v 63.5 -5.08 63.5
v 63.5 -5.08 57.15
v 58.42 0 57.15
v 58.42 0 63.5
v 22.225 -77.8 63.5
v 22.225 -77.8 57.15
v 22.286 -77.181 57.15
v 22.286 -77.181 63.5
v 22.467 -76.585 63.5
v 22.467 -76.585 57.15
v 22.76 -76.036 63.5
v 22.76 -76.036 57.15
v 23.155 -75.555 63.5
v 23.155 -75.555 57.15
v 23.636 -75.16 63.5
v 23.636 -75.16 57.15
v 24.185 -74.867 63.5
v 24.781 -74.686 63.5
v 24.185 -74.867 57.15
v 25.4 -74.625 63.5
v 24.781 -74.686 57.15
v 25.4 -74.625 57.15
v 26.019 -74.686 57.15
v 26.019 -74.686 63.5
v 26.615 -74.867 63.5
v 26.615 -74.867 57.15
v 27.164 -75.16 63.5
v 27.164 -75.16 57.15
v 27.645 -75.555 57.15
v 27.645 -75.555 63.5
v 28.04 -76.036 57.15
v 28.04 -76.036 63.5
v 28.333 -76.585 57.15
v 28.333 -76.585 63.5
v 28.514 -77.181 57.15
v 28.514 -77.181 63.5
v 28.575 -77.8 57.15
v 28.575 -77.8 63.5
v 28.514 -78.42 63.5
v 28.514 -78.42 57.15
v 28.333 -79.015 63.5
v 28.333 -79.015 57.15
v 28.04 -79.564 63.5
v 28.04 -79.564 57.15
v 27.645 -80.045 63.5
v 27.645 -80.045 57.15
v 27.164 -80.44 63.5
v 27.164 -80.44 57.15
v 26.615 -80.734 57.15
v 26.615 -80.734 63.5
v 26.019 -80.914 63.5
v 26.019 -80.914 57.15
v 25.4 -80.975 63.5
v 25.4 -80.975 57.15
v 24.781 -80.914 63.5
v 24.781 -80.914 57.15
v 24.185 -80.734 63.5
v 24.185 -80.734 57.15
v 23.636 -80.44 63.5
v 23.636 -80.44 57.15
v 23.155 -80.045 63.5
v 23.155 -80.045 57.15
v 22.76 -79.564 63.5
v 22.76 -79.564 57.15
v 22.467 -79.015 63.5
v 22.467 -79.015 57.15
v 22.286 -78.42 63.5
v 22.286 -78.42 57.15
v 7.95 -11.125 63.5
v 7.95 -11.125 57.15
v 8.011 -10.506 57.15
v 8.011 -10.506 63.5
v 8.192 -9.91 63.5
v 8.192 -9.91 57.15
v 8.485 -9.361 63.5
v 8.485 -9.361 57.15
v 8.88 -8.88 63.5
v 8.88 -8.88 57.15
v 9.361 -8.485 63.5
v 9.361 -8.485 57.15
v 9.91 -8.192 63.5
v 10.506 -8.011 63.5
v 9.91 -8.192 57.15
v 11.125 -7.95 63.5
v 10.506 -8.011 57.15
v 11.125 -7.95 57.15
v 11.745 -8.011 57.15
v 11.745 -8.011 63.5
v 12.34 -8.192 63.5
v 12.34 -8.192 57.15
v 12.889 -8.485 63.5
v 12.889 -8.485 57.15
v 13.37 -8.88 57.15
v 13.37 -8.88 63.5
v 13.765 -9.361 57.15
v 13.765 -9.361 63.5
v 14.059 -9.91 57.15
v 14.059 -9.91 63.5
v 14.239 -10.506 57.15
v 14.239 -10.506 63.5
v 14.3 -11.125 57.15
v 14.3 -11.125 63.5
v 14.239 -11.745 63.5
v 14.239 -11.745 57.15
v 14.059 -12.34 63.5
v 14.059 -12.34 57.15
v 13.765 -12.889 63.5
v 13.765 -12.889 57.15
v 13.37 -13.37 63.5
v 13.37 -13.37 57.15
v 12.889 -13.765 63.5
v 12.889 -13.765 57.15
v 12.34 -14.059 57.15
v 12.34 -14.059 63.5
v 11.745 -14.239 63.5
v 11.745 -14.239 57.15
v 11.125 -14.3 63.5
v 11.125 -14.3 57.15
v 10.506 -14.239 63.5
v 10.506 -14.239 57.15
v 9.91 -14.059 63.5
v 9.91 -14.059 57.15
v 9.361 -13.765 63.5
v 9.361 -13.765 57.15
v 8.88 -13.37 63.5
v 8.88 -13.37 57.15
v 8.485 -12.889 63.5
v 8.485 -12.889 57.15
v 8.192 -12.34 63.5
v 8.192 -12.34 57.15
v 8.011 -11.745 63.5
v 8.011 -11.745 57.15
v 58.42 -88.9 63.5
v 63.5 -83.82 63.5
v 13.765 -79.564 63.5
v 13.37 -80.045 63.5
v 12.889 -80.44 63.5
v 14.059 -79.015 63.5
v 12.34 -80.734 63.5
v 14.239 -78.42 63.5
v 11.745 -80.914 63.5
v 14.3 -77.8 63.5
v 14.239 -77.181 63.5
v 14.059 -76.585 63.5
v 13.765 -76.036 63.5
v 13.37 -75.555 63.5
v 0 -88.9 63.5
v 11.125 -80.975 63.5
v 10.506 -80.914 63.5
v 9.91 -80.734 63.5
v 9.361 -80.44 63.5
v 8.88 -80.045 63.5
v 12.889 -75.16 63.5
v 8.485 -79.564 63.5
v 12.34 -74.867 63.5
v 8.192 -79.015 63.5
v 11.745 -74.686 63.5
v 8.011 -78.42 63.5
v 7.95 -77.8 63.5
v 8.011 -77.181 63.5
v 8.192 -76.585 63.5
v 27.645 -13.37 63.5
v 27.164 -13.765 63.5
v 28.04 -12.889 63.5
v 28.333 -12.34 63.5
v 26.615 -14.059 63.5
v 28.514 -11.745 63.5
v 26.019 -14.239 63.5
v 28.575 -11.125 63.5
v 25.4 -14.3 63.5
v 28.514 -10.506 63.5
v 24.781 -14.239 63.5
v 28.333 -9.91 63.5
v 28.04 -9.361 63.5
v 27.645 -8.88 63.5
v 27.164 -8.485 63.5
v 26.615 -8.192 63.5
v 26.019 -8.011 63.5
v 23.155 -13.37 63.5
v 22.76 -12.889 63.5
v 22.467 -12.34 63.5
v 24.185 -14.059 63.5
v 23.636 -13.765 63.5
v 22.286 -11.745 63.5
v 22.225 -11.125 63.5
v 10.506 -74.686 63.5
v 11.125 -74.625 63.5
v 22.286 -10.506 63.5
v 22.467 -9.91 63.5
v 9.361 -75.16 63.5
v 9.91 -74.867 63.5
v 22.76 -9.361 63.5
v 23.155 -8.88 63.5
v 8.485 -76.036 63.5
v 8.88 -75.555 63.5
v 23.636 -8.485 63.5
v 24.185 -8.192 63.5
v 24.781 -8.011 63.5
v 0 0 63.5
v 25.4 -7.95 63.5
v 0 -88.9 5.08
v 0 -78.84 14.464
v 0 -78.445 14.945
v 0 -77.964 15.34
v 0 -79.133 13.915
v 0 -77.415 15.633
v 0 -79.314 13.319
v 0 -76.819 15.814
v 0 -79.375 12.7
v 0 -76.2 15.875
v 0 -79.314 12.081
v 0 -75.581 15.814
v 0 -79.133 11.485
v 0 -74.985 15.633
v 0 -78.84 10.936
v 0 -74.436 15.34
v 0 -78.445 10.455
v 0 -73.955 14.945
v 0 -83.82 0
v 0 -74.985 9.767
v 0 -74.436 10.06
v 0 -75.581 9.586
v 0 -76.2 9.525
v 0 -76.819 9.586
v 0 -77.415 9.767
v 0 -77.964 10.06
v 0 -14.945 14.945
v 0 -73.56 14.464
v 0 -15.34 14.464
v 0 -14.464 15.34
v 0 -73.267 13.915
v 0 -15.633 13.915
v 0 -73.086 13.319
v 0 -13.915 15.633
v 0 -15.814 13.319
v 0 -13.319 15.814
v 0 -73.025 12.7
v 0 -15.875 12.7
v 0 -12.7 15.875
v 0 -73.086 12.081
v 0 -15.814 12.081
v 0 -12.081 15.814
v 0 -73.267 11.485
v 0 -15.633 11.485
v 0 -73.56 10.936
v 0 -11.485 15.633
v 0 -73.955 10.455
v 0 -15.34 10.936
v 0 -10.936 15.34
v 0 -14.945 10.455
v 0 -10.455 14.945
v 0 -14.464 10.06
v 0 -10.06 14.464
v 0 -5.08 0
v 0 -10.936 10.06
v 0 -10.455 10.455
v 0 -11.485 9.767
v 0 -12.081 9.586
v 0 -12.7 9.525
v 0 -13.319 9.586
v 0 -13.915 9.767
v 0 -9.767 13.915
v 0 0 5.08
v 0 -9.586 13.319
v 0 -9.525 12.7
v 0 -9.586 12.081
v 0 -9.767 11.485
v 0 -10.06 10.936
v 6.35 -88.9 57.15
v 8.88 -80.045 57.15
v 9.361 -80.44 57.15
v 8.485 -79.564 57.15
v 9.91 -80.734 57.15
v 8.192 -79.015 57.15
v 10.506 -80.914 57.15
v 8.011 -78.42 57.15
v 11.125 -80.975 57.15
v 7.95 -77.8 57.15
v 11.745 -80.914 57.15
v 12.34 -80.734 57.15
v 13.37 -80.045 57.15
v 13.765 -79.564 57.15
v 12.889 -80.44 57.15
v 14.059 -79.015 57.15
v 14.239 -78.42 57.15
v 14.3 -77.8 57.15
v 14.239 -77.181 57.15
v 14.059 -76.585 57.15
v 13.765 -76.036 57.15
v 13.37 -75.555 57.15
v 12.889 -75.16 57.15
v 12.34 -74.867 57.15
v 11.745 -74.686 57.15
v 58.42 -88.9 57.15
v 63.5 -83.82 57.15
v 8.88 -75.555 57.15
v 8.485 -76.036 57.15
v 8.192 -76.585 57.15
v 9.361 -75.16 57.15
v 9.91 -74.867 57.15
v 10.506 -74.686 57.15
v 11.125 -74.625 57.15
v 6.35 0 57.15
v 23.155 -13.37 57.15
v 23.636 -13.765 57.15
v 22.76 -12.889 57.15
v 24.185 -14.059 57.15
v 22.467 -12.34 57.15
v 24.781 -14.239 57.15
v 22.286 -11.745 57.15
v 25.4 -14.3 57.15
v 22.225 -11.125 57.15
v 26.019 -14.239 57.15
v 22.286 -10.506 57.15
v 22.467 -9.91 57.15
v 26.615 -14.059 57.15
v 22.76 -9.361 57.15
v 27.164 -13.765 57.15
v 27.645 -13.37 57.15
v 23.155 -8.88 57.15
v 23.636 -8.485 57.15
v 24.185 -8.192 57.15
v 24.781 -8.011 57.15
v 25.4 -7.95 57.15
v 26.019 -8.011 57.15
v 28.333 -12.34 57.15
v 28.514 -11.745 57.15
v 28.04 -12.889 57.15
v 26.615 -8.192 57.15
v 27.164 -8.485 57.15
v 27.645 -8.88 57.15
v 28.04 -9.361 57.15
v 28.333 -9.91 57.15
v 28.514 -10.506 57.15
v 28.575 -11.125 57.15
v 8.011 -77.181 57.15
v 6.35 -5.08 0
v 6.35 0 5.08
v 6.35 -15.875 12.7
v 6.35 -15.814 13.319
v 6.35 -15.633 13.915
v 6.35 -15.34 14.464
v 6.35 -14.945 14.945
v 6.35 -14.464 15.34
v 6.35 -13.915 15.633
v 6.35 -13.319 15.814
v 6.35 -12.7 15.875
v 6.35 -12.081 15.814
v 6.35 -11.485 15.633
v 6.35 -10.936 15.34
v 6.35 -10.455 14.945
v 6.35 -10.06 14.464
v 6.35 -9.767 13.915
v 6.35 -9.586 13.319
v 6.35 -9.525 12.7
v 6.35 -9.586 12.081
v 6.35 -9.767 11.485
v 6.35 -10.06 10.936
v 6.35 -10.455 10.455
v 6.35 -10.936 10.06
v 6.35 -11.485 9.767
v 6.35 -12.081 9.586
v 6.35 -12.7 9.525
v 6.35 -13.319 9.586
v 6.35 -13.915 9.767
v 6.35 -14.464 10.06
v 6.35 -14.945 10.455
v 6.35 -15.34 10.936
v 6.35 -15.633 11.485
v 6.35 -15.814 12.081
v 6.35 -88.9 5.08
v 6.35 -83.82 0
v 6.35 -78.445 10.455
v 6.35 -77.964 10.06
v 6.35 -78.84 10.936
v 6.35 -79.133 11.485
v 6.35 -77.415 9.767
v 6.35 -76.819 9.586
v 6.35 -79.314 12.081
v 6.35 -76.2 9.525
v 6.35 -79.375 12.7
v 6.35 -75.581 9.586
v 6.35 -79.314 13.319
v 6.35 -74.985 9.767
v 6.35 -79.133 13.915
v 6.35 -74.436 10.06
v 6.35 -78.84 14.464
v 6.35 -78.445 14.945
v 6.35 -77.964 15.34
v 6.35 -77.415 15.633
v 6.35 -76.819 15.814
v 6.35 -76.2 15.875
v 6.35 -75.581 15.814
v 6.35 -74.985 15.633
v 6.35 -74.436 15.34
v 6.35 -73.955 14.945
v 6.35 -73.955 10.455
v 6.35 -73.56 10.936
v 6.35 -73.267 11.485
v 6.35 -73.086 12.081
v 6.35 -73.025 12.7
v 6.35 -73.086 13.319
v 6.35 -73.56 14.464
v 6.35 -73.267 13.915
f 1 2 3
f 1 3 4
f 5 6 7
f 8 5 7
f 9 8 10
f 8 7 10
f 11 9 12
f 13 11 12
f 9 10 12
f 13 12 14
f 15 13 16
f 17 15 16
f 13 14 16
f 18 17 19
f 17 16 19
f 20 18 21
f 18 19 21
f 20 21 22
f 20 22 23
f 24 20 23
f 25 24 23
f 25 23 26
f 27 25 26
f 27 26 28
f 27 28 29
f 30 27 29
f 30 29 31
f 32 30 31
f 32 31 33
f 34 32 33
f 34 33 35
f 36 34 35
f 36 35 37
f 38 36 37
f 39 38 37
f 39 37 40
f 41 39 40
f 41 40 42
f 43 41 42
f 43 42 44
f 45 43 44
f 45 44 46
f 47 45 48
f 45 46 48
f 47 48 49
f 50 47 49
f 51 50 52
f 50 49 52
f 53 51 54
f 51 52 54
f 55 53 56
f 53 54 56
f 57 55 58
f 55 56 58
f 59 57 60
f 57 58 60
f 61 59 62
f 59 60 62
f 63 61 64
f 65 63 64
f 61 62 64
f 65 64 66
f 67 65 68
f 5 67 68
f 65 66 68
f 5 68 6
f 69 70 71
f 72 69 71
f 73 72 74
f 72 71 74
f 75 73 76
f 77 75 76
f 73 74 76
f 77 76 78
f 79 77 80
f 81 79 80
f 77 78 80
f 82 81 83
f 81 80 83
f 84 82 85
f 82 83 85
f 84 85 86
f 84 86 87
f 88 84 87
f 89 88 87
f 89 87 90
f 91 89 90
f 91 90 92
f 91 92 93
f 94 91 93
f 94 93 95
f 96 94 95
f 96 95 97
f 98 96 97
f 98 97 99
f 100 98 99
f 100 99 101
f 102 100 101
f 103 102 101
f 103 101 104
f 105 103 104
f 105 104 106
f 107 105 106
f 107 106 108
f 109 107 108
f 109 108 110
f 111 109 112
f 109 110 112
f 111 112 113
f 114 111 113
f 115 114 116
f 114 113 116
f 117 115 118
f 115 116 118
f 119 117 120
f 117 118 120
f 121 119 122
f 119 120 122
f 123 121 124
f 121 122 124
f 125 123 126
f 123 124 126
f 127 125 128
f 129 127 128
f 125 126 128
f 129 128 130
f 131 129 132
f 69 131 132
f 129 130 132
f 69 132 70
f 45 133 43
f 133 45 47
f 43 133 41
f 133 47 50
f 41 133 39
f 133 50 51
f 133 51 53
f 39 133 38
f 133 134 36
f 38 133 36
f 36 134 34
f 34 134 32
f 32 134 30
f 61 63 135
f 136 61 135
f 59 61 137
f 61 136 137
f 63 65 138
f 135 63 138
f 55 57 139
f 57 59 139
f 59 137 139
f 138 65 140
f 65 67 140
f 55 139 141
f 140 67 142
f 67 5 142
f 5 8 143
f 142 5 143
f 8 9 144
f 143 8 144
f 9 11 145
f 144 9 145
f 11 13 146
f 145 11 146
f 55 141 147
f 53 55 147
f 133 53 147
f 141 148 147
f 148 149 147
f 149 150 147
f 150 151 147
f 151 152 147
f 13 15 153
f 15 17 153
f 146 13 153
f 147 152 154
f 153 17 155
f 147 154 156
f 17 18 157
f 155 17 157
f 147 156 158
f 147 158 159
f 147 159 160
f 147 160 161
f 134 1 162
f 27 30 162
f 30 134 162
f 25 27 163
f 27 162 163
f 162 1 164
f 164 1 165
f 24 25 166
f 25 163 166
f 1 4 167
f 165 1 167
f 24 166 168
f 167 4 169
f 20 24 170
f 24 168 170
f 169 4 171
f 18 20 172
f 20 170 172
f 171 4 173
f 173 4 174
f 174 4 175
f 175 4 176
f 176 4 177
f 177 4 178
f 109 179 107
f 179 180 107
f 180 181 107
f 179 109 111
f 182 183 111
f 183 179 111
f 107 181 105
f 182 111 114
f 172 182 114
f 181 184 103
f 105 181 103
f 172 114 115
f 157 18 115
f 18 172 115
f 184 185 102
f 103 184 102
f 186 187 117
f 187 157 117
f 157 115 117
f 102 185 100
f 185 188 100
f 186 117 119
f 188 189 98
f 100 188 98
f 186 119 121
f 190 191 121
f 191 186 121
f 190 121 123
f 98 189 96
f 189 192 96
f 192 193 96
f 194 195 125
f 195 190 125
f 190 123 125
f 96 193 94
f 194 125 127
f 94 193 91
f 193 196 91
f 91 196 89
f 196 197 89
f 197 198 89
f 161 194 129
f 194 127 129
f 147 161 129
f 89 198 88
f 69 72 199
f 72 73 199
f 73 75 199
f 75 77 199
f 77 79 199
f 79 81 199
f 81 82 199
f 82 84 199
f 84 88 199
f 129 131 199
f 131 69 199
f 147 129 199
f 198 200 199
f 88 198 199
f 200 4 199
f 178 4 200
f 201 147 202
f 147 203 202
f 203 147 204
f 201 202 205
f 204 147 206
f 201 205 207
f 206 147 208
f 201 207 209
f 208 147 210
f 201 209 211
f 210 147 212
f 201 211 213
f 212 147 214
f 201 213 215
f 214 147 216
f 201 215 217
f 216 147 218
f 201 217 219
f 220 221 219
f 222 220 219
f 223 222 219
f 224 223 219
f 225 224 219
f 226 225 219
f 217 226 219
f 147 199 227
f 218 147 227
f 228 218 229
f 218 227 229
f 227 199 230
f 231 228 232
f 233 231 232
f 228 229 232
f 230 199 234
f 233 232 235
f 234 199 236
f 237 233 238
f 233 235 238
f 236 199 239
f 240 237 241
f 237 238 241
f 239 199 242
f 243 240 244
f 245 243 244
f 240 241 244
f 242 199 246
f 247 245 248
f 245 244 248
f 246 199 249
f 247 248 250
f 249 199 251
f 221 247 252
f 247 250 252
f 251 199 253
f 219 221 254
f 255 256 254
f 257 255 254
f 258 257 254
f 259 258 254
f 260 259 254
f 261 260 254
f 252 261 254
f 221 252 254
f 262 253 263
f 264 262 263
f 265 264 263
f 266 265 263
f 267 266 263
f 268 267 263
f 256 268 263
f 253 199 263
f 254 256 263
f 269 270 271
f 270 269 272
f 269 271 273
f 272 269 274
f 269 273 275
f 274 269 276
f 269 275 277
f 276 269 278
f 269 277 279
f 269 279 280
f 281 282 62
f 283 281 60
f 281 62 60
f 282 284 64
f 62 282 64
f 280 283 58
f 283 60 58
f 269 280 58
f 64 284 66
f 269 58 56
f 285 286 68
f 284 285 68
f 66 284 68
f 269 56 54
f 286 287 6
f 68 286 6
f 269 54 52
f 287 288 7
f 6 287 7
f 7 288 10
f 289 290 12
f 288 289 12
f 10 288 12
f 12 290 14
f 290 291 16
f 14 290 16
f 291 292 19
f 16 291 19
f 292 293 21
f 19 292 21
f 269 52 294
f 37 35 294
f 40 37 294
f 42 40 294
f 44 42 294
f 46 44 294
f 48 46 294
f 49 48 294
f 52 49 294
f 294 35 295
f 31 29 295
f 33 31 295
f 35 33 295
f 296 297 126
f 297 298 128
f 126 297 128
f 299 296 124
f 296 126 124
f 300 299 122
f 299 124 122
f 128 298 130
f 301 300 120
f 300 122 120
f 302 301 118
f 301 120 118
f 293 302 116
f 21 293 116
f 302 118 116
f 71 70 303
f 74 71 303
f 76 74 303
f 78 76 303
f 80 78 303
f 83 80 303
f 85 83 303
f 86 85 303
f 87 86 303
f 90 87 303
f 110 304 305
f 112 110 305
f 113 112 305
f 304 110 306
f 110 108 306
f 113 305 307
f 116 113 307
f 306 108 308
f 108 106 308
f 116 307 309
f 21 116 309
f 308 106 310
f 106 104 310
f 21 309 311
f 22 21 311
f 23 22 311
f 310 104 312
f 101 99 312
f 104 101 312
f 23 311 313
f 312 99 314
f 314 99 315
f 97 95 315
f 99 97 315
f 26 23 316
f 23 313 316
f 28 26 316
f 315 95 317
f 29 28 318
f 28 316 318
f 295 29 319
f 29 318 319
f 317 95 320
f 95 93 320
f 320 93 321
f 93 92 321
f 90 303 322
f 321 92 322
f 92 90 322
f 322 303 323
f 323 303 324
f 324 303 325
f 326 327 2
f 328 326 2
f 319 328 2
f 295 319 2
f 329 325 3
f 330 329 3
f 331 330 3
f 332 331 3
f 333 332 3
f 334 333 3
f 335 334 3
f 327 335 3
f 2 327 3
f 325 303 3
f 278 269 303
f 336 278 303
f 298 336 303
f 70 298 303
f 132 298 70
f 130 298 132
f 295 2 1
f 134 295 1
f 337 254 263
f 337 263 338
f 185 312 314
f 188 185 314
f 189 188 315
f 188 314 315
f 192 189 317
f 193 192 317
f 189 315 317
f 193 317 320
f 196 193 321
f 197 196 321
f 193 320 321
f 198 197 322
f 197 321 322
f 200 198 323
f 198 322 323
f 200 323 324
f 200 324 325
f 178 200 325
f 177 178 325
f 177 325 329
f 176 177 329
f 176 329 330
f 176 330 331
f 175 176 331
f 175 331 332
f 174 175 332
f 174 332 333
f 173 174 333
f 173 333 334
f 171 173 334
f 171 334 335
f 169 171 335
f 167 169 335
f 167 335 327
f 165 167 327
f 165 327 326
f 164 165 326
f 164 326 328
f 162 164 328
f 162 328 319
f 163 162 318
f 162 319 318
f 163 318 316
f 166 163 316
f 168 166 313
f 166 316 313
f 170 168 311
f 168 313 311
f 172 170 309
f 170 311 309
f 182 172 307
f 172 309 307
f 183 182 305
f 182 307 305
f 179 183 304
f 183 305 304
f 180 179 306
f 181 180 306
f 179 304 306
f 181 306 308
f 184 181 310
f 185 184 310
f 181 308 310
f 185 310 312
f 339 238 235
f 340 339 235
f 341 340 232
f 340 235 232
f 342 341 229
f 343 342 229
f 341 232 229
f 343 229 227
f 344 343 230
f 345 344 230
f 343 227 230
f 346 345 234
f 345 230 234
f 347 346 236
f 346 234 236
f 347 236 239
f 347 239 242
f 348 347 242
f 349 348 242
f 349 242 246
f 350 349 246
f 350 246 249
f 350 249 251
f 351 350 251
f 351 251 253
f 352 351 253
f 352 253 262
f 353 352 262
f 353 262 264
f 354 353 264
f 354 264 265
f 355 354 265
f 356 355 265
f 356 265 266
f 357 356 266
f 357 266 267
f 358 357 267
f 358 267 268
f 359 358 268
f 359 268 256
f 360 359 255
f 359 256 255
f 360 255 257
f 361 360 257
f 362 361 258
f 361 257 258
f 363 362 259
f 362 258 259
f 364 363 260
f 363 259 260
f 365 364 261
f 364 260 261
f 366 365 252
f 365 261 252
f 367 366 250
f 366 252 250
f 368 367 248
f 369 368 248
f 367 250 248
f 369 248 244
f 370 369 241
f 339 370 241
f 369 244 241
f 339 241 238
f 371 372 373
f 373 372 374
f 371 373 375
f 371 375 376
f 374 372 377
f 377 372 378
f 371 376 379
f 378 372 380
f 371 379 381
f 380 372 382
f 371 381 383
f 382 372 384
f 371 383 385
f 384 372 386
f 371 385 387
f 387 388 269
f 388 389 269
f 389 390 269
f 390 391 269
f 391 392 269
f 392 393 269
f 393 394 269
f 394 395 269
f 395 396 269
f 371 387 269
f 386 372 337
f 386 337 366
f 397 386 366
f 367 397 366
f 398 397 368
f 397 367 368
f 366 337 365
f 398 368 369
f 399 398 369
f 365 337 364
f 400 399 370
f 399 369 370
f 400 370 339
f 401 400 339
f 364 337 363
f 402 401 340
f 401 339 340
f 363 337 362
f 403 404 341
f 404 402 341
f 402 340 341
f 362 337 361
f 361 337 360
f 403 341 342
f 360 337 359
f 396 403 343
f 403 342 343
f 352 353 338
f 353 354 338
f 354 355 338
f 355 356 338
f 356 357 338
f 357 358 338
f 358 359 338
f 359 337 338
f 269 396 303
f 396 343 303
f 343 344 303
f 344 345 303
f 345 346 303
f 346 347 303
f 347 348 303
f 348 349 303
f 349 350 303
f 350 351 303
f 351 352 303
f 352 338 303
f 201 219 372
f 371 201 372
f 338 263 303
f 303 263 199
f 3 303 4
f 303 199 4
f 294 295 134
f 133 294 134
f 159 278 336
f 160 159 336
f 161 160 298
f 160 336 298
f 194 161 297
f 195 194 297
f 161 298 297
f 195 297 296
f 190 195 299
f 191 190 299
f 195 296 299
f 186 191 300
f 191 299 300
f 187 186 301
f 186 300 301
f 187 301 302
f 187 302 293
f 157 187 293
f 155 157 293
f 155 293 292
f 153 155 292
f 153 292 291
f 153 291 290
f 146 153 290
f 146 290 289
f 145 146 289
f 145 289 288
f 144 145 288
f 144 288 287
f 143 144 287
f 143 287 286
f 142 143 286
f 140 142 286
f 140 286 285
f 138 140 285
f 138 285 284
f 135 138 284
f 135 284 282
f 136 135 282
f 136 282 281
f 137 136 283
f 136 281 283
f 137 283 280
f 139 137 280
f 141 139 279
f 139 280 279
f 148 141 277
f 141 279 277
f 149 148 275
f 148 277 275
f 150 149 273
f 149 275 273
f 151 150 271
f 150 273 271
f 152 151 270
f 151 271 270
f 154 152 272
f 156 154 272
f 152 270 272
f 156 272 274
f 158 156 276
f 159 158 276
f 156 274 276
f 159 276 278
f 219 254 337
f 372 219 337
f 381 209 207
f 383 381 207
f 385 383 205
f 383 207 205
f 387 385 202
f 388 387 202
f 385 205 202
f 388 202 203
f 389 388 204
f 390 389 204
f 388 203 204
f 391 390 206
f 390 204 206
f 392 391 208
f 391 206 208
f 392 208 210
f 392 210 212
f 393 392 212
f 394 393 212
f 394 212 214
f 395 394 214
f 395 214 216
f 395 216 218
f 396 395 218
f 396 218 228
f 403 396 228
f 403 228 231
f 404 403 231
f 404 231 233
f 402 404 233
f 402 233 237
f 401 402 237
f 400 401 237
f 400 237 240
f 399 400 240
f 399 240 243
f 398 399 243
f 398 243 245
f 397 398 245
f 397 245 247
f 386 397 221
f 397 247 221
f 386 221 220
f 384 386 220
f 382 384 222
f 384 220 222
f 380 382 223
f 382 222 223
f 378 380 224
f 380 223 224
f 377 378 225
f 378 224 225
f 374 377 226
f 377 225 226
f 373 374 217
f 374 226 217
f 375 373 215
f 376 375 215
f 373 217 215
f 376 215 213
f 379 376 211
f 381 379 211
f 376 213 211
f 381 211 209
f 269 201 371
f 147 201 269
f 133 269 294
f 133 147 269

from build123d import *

# Parameters (mm, degrees)
F1_DEPTH = 88.9
F3_D     = 6.35
F4_SIZE  = 5.08
F6_D     = 6.35


with BuildPart() as f1:
    # F0 (on Front) → F1 (new body)
    with BuildSketch(Plane.XZ):
        Polygon((0, 63.5), (0, 0), (6.35, 0), (6.35, 57.15), (63.5, 57.15), (63.5, 63.5), align=None)
    extrude(amount=F1_DEPTH)

    # F3 (through all)
    with Locations(Plane.YZ.offset(6.35)):
        with Locations((-76.2, 12.7), (-12.7, 12.7)):
            Hole(F3_D / 2)

    # F4
    f4_edges = [f1.edges().sort_by_distance(p)[0] for p in [
        (3.175, -88.9, 0),
        (3.175, 0, 0),
        (63.5, -88.9, 60.325),
        (63.5, 0, 60.325),
    ]]
    chamfer(f4_edges, length=F4_SIZE)

    # F6 (through all)
    with Locations(Plane.XY.offset(63.5)):
        with Locations((25.4, -11.1252), (11.1252, -11.1252), (11.1252, -77.8002), (25.4, -77.8002)):
            Hole(F6_D / 2)


solid = f1.part
